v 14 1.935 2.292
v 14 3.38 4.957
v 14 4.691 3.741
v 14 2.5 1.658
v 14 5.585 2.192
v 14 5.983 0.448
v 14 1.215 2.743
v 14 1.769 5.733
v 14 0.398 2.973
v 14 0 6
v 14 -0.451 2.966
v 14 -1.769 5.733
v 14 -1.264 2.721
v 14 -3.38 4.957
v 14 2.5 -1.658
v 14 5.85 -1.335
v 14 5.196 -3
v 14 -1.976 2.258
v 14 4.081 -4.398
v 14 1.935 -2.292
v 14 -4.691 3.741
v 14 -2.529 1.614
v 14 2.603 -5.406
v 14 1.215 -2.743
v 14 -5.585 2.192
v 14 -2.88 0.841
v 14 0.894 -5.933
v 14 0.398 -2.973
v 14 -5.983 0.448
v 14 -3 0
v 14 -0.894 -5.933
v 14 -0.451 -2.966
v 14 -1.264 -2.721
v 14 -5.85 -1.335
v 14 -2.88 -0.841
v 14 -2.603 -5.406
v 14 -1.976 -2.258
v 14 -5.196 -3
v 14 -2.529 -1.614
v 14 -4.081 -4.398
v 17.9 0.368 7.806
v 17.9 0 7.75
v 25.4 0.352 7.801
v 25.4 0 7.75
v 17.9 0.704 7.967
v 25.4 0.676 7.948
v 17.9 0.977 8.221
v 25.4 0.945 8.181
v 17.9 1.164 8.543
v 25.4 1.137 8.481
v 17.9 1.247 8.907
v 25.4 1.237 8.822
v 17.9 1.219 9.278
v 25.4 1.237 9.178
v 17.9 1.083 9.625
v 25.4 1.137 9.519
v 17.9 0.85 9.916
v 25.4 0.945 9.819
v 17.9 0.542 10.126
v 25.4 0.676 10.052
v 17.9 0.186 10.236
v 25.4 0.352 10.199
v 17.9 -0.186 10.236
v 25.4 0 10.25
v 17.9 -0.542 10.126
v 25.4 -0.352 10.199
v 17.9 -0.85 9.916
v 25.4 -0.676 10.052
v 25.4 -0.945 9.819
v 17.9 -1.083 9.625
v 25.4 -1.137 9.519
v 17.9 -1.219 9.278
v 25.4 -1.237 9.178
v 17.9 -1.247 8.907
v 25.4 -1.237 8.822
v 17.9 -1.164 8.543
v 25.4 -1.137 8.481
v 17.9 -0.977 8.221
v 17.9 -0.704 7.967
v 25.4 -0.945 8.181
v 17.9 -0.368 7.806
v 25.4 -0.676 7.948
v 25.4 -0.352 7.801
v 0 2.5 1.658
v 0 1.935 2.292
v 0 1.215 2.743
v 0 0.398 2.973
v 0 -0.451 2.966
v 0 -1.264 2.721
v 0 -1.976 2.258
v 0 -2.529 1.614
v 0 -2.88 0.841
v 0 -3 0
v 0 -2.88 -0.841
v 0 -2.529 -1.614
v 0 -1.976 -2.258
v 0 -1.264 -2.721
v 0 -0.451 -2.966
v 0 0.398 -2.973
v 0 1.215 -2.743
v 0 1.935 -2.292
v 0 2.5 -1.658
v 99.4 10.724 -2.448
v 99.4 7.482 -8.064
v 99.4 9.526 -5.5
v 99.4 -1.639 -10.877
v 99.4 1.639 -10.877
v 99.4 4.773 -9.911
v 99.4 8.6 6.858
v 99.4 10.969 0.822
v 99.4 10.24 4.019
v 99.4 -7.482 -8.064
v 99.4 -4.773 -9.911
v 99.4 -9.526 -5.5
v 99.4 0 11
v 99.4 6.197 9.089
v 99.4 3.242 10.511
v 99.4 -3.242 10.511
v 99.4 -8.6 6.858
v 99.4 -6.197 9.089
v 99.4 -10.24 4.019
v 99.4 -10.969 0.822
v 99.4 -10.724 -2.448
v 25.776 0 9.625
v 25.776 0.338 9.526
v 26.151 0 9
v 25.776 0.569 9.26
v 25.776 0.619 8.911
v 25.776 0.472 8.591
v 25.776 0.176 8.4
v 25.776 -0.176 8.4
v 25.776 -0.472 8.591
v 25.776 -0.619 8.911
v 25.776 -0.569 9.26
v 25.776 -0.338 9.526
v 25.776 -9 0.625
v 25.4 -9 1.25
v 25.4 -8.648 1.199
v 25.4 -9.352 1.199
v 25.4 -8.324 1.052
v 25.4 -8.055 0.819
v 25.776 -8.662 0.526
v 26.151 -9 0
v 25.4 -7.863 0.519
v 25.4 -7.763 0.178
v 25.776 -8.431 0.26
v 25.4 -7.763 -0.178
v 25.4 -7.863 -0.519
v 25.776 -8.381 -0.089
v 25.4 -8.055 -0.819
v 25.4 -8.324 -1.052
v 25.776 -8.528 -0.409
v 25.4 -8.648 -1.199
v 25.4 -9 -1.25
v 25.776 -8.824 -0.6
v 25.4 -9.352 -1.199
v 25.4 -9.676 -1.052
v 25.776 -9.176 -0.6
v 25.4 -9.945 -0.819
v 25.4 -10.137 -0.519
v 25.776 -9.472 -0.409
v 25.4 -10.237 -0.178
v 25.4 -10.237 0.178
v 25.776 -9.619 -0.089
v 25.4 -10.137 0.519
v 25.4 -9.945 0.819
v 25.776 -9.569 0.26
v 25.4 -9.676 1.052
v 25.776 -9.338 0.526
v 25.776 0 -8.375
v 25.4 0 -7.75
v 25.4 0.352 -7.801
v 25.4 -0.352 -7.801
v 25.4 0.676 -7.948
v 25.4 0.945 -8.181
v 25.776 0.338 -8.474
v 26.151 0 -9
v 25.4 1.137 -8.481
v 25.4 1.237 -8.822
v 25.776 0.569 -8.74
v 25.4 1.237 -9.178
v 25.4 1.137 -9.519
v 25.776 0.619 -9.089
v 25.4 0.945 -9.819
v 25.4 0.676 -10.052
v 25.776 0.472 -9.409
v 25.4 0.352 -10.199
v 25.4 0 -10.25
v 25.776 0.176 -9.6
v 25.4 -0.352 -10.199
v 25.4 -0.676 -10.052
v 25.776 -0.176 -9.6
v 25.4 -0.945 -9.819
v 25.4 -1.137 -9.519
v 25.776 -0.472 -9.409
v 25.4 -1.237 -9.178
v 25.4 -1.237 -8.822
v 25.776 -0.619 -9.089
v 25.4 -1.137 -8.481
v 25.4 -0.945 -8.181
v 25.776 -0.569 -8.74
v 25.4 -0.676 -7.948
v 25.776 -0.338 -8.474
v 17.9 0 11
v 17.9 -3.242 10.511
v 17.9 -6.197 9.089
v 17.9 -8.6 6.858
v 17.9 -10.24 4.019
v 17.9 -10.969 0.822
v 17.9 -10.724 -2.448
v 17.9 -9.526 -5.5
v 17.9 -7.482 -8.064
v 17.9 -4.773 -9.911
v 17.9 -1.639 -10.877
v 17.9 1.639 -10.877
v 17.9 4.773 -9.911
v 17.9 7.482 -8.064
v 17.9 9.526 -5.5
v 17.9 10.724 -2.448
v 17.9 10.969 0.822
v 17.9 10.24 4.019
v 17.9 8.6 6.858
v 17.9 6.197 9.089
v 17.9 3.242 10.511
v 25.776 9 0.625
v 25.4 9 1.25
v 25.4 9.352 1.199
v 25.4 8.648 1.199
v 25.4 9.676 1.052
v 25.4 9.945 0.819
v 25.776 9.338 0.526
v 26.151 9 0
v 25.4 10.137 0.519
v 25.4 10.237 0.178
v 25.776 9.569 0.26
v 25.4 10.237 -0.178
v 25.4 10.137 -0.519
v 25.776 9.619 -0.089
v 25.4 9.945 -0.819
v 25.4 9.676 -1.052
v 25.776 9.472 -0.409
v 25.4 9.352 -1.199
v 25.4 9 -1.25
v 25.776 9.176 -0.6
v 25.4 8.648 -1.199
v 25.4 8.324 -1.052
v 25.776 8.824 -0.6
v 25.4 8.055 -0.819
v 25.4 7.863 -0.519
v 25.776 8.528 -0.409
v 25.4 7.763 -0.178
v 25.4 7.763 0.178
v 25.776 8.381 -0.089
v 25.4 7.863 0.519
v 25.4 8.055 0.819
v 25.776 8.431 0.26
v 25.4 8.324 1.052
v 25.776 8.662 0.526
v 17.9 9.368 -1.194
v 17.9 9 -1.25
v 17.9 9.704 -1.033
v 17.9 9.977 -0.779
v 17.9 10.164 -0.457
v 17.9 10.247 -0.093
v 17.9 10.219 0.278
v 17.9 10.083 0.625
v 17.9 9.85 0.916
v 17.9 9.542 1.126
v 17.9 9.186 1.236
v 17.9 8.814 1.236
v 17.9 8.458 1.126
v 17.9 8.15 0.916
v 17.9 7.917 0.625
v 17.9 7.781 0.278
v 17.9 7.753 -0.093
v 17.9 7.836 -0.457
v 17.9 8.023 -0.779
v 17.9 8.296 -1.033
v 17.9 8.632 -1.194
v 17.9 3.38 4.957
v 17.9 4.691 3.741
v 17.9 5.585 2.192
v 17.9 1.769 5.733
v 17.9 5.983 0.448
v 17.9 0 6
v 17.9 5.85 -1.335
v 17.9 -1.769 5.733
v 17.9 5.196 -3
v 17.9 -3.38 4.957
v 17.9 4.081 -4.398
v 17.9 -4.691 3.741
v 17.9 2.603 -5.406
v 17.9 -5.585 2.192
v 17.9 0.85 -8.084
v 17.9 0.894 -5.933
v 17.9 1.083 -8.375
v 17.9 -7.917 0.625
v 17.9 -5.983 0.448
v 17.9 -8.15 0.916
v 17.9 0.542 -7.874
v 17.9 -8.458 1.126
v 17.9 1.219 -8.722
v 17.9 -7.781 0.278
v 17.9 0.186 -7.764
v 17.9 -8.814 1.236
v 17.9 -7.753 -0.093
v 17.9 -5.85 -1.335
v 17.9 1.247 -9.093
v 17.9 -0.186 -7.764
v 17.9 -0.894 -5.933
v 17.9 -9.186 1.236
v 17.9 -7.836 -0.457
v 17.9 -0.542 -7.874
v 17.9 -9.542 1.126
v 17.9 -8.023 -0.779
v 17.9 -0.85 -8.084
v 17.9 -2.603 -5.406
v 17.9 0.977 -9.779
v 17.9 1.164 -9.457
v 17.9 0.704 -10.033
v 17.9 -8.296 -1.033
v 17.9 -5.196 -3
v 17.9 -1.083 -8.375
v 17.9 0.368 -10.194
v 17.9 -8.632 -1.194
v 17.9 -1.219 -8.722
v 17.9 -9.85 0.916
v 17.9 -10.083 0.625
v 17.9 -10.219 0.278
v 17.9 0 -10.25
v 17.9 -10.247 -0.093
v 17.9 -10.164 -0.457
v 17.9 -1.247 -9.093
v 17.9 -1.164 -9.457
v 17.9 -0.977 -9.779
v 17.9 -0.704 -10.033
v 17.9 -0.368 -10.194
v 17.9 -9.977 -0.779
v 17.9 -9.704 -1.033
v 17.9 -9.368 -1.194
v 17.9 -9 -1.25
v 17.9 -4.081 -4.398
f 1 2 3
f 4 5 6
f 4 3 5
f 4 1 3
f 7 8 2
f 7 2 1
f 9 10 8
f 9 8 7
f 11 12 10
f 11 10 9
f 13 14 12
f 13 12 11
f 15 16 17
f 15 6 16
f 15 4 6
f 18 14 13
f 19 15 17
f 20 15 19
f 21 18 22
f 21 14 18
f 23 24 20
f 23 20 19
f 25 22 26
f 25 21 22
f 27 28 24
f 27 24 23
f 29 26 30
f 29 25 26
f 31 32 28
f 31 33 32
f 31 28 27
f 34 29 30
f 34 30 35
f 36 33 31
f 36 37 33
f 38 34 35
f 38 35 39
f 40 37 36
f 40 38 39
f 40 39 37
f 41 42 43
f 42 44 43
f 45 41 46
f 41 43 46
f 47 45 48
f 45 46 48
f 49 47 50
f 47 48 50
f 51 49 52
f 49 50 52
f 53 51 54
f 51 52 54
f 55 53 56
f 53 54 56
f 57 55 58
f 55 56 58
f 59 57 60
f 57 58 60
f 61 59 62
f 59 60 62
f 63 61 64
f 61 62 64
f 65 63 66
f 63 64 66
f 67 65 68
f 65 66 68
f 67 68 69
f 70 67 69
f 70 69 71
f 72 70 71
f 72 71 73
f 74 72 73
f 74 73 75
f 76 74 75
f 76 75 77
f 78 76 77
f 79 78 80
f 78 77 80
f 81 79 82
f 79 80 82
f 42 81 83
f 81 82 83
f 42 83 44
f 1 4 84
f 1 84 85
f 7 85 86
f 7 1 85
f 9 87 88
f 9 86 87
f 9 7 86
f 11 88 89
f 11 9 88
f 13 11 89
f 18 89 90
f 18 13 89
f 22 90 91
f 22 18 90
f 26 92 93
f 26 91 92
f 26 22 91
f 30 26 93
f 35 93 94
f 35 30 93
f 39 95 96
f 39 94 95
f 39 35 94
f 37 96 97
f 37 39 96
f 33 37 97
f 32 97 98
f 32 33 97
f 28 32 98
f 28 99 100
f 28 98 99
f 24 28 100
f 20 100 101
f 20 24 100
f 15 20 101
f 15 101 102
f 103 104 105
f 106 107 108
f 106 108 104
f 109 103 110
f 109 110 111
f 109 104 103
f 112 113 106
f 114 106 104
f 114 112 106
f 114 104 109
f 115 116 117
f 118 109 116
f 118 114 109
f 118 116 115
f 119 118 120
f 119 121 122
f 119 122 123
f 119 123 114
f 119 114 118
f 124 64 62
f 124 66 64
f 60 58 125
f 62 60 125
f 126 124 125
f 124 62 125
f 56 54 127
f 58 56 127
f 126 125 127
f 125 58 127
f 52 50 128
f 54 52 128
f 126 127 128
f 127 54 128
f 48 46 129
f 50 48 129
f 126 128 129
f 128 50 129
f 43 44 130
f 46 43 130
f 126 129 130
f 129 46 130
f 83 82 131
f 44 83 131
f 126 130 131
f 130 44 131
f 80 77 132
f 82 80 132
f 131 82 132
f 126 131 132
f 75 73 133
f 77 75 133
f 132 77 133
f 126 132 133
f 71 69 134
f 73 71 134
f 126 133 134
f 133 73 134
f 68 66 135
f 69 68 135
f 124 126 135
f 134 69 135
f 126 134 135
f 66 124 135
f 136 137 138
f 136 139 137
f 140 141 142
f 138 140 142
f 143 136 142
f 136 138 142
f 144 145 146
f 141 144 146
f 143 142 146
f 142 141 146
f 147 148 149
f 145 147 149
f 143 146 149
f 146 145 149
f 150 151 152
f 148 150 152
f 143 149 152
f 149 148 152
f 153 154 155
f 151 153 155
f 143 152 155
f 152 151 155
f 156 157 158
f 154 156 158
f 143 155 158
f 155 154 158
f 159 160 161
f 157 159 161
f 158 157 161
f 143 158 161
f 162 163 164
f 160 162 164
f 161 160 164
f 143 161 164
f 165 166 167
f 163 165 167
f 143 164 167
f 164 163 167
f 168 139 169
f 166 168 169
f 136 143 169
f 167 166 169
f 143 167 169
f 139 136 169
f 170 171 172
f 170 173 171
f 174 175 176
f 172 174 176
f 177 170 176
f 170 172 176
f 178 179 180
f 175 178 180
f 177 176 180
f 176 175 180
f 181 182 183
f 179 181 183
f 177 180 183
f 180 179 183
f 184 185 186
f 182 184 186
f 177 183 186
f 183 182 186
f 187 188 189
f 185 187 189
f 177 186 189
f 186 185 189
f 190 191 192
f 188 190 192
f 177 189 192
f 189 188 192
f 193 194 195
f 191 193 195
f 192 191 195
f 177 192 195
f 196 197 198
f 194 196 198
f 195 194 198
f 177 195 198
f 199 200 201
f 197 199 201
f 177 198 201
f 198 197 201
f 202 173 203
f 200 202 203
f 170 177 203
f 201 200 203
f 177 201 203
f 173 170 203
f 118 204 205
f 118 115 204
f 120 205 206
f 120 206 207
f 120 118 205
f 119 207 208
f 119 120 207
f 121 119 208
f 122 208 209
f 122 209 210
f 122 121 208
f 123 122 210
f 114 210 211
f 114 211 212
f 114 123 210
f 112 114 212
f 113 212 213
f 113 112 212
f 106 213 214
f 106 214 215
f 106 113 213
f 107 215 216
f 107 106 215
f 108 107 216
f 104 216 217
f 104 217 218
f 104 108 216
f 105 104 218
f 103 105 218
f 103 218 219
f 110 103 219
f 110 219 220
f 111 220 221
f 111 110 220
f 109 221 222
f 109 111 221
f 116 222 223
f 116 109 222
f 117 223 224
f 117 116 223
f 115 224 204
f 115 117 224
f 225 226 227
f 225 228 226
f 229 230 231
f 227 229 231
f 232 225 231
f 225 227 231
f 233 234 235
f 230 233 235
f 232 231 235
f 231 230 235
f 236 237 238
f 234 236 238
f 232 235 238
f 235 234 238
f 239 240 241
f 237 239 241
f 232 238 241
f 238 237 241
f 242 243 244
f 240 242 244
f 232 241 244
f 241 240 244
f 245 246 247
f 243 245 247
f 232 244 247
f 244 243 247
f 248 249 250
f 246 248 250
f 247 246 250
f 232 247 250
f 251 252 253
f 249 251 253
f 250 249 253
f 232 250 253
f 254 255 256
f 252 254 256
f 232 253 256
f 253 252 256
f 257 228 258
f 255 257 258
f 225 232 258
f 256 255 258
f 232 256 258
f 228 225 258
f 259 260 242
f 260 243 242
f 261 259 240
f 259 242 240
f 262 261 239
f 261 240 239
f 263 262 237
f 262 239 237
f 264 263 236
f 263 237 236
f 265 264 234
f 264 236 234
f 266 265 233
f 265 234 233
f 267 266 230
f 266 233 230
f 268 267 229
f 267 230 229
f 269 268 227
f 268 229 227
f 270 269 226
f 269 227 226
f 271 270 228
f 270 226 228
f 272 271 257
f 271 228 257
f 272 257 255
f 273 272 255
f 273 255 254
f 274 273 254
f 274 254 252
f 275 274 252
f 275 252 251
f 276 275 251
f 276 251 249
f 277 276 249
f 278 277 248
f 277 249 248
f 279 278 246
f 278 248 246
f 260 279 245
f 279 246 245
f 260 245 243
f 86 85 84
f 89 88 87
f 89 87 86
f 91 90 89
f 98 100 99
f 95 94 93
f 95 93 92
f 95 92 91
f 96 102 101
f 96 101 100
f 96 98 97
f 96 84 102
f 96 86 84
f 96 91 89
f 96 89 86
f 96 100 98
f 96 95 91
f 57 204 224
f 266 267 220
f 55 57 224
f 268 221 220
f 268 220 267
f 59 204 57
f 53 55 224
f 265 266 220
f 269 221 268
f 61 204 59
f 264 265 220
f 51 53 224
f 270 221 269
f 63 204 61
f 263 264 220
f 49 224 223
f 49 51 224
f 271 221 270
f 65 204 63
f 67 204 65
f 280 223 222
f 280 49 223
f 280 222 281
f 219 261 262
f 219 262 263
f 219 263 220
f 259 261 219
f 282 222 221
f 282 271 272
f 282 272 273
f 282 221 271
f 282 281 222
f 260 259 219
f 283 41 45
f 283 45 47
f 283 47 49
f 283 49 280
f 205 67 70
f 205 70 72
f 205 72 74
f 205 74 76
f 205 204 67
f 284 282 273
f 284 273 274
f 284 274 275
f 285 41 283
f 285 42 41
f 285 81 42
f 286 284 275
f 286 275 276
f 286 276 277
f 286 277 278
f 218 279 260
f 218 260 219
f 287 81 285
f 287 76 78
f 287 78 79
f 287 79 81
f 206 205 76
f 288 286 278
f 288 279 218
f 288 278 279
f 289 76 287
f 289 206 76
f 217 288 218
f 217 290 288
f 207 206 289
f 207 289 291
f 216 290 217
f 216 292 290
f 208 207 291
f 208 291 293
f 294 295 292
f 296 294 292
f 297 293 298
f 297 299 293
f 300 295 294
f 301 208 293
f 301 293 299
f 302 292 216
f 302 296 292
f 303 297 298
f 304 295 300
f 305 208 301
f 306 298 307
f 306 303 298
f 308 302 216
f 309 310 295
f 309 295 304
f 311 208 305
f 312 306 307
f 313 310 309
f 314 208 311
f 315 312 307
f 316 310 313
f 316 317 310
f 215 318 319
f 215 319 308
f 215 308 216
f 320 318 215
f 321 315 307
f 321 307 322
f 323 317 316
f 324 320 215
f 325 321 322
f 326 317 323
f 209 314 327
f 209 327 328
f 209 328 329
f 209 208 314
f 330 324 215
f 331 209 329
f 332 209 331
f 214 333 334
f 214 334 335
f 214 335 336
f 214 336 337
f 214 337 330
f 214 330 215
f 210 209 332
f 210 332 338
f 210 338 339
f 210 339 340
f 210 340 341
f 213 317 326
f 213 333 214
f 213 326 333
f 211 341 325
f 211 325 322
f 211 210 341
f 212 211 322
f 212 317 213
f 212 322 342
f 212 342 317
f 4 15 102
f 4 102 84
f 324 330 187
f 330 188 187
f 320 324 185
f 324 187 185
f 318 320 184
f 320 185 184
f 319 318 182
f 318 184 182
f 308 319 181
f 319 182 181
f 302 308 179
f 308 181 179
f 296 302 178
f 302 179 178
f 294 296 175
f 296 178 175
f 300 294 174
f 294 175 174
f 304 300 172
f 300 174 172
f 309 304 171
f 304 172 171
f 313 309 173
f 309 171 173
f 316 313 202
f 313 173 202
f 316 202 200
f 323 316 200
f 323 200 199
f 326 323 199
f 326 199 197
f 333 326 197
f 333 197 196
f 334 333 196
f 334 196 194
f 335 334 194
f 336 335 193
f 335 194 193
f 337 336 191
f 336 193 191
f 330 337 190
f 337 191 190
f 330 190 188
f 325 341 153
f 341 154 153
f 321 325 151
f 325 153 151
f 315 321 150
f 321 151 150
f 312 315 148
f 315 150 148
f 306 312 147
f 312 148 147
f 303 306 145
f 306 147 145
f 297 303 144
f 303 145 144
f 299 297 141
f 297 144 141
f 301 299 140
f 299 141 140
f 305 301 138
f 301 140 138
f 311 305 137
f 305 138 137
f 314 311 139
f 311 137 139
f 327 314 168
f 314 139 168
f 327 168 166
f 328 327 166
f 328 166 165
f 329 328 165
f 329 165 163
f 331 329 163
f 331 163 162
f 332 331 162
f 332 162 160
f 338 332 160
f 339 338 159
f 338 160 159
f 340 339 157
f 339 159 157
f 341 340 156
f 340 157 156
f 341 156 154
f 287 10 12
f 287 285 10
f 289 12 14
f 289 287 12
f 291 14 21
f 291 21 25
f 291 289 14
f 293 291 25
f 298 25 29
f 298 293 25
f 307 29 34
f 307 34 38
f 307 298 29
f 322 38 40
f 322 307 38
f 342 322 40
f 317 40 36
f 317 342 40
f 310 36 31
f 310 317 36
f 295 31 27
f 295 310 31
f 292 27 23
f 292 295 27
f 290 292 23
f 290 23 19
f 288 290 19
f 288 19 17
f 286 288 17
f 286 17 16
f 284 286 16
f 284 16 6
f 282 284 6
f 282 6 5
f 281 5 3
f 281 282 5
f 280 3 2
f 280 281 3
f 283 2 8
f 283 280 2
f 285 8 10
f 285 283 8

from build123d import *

# Parameters (mm, degrees)
M3X0_5_TAPPED_HOLE1_D     = 2.5
M3X0_5_TAPPED_HOLE1_DEPTH = 7.5
M3X0_5_TAPPED_HOLE1_TIP   = 0.751075774
CUT_EXTRUDE1_START        = -14
CUT_EXTRUDE1_DEPTH        = 14


with BuildPart() as part:
    # Sketch1 → Revolve1 (revolve)
    with BuildSketch(Plane.XY, mode=Mode.PRIVATE) as revolve1_sk:
        Polygon((0, 0), (0, 3), (14, 3), (14, 6), (17.9, 6), (17.9, 11), (99.4, 11), (99.4, 0), align=None)
    revolve(revolve1_sk.sketch.rotate(Axis((0, 0, 0), (1, 0, 0)), 90), axis=Axis((0, 0, 0), (1, 0, 0)))

    # M3x0.5 Tapped Hole1
    with Locations(Plane.ZY.offset(-17.9)):
        with Locations((-9, 0), (0, 9), (9, 0), (0, -9)):
            Hole(M3X0_5_TAPPED_HOLE1_D / 2, depth=M3X0_5_TAPPED_HOLE1_DEPTH)
            with Locations((0, 0, -(M3X0_5_TAPPED_HOLE1_DEPTH + M3X0_5_TAPPED_HOLE1_TIP / 2))):  # 118° drill point
                Cone(0, M3X0_5_TAPPED_HOLE1_D / 2, M3X0_5_TAPPED_HOLE1_TIP, mode=Mode.SUBTRACT)

    # Sketch4 → Cut-Extrude1 (cut)
    with BuildSketch(Plane.ZY.offset(CUT_EXTRUDE1_START)):
        with BuildLine():
            Line((-1.658312395, 2.5), (1.658312395, 2.5))
            ThreePointArc((1.658312395, 2.5), (0, 3), (-1.658312395, 2.5))
        make_face()
    extrude(amount=CUT_EXTRUDE1_DEPTH, mode=Mode.SUBTRACT)


solid = part.part
